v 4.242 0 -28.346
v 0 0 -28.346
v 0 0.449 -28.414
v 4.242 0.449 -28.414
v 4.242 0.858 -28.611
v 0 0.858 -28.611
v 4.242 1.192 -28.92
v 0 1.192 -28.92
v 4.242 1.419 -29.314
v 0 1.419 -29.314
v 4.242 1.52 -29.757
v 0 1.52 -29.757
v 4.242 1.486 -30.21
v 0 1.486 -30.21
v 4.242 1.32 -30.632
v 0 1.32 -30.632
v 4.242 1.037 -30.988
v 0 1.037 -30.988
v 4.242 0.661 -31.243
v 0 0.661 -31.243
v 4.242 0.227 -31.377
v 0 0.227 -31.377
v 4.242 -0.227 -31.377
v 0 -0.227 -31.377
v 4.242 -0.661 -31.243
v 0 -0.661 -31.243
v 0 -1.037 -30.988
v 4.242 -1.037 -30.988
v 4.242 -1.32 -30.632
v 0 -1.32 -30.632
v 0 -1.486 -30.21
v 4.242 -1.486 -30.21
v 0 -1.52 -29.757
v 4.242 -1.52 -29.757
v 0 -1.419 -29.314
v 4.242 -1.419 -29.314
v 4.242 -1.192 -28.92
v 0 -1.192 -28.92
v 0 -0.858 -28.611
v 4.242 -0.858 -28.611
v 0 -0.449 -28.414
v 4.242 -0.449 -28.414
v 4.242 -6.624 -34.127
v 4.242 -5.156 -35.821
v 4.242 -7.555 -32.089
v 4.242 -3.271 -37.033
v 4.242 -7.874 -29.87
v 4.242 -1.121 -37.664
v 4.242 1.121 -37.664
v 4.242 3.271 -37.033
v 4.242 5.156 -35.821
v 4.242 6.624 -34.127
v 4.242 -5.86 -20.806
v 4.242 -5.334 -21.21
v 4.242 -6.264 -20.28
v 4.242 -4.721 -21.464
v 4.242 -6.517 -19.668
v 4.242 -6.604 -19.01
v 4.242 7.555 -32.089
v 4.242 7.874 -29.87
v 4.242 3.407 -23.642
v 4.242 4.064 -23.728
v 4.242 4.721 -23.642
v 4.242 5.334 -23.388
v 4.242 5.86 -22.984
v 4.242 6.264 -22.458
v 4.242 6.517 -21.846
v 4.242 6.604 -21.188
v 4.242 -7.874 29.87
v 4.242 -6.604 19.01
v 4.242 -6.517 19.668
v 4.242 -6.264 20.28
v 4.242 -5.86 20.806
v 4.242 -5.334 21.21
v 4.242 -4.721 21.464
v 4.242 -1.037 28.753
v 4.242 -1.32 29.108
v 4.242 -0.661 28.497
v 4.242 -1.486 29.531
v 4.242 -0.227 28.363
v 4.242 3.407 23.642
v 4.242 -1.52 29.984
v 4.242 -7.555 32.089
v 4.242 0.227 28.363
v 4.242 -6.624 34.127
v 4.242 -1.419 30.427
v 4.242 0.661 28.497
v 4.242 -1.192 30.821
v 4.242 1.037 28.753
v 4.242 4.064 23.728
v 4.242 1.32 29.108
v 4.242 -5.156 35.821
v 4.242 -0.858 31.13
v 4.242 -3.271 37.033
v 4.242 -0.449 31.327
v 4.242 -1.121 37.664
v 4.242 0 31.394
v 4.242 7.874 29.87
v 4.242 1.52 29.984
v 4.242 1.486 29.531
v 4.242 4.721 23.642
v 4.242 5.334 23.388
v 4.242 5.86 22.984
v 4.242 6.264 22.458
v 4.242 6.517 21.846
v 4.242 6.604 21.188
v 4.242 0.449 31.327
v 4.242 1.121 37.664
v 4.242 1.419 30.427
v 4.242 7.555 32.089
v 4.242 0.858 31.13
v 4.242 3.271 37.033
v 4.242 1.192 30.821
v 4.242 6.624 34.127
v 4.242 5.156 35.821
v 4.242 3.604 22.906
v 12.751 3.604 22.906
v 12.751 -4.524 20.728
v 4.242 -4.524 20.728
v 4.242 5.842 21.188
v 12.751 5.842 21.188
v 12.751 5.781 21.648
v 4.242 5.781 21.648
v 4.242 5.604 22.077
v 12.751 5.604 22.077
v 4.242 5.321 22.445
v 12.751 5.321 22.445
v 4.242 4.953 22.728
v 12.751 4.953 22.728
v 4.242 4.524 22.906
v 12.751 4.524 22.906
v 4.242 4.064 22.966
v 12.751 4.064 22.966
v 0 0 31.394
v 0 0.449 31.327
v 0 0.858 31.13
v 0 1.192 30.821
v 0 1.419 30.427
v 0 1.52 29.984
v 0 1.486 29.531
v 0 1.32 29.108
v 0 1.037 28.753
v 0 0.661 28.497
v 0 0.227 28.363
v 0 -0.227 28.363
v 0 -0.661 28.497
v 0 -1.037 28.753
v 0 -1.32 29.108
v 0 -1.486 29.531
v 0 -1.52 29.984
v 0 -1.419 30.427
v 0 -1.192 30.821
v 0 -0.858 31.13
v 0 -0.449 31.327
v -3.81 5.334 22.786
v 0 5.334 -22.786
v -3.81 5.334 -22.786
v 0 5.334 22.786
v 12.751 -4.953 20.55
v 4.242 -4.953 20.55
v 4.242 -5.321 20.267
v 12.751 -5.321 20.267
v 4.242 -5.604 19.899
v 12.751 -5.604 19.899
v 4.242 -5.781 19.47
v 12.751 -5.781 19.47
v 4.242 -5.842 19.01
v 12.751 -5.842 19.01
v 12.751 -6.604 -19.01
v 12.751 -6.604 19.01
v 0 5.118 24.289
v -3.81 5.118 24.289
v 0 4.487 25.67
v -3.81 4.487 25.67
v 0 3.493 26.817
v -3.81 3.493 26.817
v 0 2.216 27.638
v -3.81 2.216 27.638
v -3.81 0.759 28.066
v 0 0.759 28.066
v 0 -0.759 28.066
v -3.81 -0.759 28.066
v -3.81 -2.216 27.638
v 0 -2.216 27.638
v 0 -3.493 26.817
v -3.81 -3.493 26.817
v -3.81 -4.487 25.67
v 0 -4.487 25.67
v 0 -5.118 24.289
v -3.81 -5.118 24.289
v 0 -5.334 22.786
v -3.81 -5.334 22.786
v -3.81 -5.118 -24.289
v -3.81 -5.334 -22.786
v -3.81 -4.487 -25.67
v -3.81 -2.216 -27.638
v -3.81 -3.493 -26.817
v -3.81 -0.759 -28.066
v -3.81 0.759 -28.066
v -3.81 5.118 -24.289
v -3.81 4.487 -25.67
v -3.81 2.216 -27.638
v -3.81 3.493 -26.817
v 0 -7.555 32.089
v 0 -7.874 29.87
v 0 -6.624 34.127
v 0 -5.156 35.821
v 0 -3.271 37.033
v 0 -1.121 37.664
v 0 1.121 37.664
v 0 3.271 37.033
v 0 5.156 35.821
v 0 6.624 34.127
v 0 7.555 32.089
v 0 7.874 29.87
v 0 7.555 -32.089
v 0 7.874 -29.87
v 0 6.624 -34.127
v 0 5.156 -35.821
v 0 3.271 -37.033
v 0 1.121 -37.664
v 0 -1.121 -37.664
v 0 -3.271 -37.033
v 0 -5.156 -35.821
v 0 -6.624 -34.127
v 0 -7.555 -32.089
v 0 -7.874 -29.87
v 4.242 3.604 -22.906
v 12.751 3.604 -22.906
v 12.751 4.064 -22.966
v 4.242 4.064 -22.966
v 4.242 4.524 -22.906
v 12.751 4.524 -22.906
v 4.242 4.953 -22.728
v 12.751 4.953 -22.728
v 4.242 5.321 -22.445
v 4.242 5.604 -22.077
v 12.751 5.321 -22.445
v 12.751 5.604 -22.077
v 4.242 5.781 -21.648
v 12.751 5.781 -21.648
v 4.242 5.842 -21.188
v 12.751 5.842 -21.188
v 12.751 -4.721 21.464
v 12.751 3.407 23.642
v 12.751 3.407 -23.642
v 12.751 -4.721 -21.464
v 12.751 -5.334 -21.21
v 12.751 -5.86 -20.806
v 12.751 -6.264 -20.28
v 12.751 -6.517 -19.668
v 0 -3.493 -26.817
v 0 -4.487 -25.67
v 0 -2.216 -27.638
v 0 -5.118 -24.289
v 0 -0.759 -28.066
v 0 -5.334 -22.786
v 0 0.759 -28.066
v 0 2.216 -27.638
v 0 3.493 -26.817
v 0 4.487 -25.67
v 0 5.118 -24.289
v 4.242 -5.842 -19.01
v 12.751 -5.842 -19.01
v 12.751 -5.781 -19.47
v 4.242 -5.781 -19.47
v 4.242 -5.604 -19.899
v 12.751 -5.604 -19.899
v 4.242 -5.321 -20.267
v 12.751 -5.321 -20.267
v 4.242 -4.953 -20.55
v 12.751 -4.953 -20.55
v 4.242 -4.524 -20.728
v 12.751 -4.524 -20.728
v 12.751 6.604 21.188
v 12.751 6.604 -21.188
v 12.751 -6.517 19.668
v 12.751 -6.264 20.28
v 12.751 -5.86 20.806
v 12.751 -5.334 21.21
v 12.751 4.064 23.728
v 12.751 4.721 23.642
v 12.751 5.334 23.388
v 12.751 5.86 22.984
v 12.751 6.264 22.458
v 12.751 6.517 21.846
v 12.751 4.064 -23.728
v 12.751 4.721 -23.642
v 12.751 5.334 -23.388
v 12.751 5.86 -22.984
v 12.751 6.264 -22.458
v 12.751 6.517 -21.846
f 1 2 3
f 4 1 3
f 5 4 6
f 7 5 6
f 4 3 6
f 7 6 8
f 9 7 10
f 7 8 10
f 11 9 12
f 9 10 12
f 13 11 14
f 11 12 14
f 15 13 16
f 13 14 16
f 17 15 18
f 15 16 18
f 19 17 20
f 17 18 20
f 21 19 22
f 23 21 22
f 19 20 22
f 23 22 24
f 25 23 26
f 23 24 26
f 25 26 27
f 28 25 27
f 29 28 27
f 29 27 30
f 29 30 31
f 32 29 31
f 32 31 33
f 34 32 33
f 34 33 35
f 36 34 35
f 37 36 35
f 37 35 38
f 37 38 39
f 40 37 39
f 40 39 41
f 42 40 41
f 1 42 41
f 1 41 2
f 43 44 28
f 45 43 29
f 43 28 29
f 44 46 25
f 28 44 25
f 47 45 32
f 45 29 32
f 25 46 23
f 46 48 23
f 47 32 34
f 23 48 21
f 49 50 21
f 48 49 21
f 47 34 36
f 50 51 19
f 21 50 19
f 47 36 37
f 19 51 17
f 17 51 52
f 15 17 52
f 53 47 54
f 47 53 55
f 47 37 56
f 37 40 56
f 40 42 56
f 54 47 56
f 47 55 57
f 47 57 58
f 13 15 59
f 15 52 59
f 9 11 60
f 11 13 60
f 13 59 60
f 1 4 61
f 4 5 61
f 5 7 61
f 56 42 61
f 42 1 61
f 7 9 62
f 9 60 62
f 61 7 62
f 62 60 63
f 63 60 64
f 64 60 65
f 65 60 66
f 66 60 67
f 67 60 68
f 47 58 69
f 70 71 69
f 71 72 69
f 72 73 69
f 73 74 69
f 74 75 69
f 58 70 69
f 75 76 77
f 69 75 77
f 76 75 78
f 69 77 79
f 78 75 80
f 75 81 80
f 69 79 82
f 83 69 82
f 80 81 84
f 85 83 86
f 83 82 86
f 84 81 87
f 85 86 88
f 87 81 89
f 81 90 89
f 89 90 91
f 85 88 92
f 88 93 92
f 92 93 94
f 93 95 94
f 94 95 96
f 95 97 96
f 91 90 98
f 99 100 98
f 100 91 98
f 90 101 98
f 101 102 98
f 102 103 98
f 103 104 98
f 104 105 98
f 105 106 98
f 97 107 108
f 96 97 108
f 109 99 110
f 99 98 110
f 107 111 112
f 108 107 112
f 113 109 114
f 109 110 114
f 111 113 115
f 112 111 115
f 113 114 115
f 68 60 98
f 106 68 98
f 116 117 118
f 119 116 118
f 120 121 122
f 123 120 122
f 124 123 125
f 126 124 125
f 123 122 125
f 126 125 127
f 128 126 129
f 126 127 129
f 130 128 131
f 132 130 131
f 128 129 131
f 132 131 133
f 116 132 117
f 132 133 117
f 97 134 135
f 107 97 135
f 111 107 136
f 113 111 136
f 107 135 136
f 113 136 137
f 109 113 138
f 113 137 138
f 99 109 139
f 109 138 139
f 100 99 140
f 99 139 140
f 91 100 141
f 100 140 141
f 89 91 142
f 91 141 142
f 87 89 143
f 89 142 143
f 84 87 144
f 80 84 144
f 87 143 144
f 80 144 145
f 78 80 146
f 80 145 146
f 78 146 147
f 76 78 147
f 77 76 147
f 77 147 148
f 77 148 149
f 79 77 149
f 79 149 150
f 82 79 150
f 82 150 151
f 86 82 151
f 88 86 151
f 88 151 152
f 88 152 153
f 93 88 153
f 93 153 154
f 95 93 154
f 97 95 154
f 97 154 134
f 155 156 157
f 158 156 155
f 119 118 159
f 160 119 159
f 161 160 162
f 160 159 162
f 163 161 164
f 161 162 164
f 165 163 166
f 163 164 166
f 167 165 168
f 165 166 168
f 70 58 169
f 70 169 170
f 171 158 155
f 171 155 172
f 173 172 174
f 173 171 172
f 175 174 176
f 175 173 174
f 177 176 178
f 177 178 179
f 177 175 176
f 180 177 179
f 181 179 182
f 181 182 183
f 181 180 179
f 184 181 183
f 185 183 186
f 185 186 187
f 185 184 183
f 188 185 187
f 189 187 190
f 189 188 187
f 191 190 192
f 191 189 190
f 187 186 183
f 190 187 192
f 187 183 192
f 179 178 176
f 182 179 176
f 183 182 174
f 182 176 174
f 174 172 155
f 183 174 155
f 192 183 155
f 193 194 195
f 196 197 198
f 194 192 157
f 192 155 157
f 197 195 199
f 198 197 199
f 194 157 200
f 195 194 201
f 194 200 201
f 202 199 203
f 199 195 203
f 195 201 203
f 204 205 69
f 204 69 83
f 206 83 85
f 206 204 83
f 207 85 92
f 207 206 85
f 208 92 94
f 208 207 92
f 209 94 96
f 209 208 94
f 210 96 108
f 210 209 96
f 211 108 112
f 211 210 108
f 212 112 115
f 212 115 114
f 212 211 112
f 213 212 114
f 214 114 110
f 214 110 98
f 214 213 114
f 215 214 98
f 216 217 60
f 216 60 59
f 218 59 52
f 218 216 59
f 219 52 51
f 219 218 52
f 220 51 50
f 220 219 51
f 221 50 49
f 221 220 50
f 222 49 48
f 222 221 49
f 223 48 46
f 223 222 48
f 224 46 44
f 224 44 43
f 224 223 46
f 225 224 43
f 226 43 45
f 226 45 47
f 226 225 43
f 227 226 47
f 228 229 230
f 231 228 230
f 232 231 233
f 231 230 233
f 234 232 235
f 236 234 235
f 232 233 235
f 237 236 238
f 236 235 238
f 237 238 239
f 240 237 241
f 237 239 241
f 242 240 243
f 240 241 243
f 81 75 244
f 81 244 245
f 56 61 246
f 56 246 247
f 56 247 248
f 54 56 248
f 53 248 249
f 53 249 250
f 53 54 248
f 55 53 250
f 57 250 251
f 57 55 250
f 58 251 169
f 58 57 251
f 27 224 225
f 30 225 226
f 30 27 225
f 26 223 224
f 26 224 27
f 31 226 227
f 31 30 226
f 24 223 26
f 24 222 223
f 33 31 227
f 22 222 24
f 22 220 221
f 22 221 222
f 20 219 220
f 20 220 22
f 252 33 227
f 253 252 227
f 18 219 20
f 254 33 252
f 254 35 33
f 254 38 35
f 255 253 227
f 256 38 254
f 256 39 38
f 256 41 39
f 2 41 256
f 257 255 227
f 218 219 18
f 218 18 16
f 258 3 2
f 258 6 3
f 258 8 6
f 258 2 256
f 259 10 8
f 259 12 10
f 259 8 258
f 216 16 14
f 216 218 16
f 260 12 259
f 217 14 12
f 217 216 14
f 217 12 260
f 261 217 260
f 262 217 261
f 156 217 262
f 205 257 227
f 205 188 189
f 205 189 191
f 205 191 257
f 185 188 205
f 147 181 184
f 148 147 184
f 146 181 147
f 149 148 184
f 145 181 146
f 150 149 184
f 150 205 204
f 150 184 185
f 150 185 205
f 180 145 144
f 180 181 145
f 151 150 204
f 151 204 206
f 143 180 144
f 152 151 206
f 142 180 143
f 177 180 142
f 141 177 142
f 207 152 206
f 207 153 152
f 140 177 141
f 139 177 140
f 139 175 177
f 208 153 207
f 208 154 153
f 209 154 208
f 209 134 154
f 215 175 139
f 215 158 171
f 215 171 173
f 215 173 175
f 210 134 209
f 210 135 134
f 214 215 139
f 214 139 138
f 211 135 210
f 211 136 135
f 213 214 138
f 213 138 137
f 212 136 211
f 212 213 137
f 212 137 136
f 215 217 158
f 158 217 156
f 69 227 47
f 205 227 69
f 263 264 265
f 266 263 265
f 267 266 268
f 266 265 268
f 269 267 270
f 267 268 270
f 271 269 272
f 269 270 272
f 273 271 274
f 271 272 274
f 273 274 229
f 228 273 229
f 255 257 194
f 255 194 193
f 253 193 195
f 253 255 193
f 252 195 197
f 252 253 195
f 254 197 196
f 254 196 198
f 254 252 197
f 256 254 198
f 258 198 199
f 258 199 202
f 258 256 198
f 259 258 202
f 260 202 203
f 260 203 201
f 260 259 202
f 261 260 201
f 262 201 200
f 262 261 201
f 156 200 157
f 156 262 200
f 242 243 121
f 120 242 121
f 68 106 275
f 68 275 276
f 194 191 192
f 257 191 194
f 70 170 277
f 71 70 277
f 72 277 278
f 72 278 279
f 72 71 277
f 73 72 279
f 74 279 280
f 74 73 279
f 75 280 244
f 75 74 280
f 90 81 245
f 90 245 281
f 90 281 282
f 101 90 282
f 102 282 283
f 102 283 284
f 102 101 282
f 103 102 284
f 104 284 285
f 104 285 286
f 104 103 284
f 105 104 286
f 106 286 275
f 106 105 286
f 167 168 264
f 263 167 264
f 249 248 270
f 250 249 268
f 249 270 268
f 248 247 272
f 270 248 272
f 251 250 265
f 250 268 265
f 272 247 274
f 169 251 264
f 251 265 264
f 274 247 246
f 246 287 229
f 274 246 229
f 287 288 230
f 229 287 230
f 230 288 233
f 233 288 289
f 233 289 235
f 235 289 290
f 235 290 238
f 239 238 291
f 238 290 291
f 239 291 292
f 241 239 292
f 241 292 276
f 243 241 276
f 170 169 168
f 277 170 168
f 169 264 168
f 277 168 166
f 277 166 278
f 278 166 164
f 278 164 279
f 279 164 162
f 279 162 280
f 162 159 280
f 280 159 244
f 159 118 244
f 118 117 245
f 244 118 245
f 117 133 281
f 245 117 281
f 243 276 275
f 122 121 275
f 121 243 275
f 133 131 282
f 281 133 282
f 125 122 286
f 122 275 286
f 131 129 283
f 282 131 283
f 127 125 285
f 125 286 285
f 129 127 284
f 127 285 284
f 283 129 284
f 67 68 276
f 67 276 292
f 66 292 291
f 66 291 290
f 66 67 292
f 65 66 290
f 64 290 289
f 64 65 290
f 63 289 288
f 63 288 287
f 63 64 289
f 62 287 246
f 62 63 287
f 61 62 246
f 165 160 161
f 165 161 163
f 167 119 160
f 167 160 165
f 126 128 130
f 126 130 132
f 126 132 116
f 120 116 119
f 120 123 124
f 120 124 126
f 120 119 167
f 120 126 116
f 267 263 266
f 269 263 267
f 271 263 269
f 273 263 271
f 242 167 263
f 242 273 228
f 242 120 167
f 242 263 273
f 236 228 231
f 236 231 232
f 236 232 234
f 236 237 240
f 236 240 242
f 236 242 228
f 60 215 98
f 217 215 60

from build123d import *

# Parameters (mm, degrees)
BOSS_EXTRUDE1_DEPTH      = 4.2418
BOSS_EXTRUDE2_DEPTH      = 8.509
CUT_EXTRUDE1_DEPTH       = 8.509
X_0_397_DIAMETER_HOLE1_D = 3.048
BOSS_EXTRUDE3_DEPTH      = 3.81


with BuildPart() as part:
    # Sketch1 → Boss-Extrude1 (new body)
    with BuildSketch(Plane(origin=(0, 0, 0), x_dir=(0, 0, -1), z_dir=(1, 0, 0))):
        with BuildLine():
            Line((-29.8704, 7.874), (29.8704, 7.874))
            ThreePointArc((29.8704, 7.874), (37.7444, 0), (29.8704, -7.874))
            Line((29.8704, -7.874), (-29.8704, -7.874))
            ThreePointArc((-29.8704, -7.874), (-37.7444, 0), (-29.8704, 7.874))
        make_face()
    extrude(amount=BOSS_EXTRUDE1_DEPTH)

    # Sketch2 → Boss-Extrude2 (add)
    with BuildSketch(Plane(origin=(4.2418, 0, 0), x_dir=(0, 0, -1), z_dir=(1, 0, 0))):
        with BuildLine():
            Line((-21.188107553, 6.604), (21.188107553, 6.604))
            ThreePointArc((21.188107553, 6.604), (23.203225037, 5.61025403), (23.641559152, 3.406599625))
            Line((23.641559152, 3.406599625), (21.463668116, -4.721400375))
            ThreePointArc((21.463668116, -4.721400375), (20.556470547, -6.079117484), (19.010216517, -6.604))
            Line((19.010216517, -6.604), (-19.010216517, -6.604))
            ThreePointArc((-19.010216517, -6.604), (-20.556470547, -6.079117484), (-21.463668116, -4.721400375))
            Line((-21.463668116, -4.721400375), (-23.641559152, 3.406599625))
            ThreePointArc((-23.641559152, 3.406599625), (-23.203225037, 5.61025403), (-21.188107553, 6.604))
        make_face()
    extrude(amount=BOSS_EXTRUDE2_DEPTH)

    # Sketch3 → Cut-Extrude1 (cut)
    with BuildSketch(Plane(origin=(12.7508, 0, 0), x_dir=(0, 0, -1), z_dir=(1, 0, 0))):
        with BuildLine():
            Line((-22.905523672, 3.603819738), (-20.727632636, -4.524180262))
            ThreePointArc((-20.727632636, -4.524180262), (-20.092594338, -5.474582239), (-19.010216517, -5.842))
            Line((-19.010216517, -5.842), (19.010216517, -5.842))
            ThreePointArc((19.010216517, -5.842), (20.092594338, -5.474582239), (20.727632636, -4.524180262))
            Line((20.727632636, -4.524180262), (22.905523672, 3.603819738))
            ThreePointArc((22.905523672, 3.603819738), (22.598689792, 5.146377821), (21.188107553, 5.842))
            Line((21.188107553, 5.842), (-21.188107553, 5.842))
            ThreePointArc((-21.188107553, 5.842), (-22.598689792, 5.146377821), (-22.905523672, 3.603819738))
        make_face()
    extrude(amount=-CUT_EXTRUDE1_DEPTH, mode=Mode.SUBTRACT)

    # X (0.397) Diameter Hole1 (through all)
    with Locations(Plane(origin=(4.2418, 0, 0), x_dir=(0, 0, -1), z_dir=(1, 0, 0))):
        with Locations((-29.8704, 0), (29.8704, 0)):
            Hole(X_0_397_DIAMETER_HOLE1_D / 2)

    # Sketch7 → Boss-Extrude3 (add)
    with BuildSketch(Plane.ZY):
        with BuildLine():
            Line((-22.786295813, 5.334), (22.786295813, 5.334))
            ThreePointArc((22.786295813, 5.334), (28.120295813, 0), (22.786295813, -5.334))
            Line((22.786295813, -5.334), (-22.786295813, -5.334))
            ThreePointArc((-22.786295813, -5.334), (-28.120295813, 0), (-22.786295813, 5.334))
        make_face()
    extrude(amount=BOSS_EXTRUDE3_DEPTH)


solid = part.part
